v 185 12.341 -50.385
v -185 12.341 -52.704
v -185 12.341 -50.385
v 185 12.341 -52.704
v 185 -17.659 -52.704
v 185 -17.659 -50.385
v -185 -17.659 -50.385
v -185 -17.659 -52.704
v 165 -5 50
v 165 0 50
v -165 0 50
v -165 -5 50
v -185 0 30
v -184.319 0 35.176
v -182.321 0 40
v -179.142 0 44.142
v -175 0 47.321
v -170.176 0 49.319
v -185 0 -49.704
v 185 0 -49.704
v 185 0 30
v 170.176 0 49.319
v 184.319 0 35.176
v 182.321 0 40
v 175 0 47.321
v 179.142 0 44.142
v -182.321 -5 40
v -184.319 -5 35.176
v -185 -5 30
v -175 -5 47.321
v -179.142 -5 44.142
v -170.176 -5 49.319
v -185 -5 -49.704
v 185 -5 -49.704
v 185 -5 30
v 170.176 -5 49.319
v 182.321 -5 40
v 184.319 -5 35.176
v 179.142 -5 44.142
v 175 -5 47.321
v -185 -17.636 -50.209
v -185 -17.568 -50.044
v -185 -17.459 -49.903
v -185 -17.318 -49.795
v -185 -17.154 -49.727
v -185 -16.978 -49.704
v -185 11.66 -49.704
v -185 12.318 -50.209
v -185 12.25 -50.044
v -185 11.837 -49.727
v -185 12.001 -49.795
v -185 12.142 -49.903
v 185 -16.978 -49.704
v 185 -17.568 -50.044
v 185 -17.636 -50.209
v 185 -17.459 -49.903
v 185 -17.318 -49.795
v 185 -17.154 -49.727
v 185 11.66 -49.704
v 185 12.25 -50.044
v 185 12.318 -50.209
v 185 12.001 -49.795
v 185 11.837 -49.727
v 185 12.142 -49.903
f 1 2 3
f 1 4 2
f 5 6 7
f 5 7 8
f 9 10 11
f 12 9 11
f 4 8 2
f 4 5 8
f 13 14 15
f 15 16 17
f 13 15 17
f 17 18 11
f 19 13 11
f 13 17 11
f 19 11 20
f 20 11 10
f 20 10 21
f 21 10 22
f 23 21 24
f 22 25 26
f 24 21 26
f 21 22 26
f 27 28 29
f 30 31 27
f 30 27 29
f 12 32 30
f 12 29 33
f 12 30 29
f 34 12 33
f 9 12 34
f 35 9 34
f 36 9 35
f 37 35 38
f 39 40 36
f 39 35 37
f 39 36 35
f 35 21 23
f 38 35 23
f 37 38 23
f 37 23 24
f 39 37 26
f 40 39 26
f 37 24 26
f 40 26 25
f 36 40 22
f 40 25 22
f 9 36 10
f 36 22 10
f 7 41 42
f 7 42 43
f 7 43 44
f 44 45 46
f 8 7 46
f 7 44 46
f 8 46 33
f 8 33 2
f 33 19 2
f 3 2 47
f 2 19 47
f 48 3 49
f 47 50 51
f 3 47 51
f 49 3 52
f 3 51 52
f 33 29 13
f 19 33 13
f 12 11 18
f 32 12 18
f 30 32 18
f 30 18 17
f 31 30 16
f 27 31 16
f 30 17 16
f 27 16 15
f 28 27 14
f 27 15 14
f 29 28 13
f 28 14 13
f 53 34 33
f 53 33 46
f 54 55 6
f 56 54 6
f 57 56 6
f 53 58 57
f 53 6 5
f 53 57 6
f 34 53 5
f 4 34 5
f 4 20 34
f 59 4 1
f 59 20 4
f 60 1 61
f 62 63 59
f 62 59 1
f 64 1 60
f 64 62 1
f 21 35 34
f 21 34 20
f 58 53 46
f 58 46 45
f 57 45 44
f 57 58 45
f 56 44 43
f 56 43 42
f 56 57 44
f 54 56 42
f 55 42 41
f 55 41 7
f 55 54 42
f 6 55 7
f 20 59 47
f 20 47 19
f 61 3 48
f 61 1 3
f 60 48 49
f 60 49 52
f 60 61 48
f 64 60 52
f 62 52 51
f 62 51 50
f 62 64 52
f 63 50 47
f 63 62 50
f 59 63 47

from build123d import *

# Parameters (mm, degrees)
F1_DEPTH = 5
F3_DEPTH = 185


with BuildPart() as f1:
    # F0 (on Front) → F1 (new body)
    with BuildSketch(Plane.XZ):
        with BuildLine():
            ThreePointArc((185, 30), (179.1421356237, 44.1421356237), (165, 50))
            Line((165, 50), (-165, 50))
            ThreePointArc((-165, 50), (-179.1421356237, 44.1421356237), (-185, 30))
            Line((-185, 30), (-185, -50))
            Line((-185, -50), (185, -50))
            Line((185, -50), (185, 30))
        make_face()
    extrude(amount=F1_DEPTH)

    # F2 (on Right) → F3 (join, symmetric)
    with BuildSketch(Plane.YZ):
        with BuildLine():
            ThreePointArc((12.3411369137, -50.3849132597), (12.1417214903, -49.9034818398), (11.6602900704, -49.7040664163))
            Line((11.6602900704, -49.7040664163), (-16.9780162429, -49.7040664163))
            ThreePointArc((-16.9780162429, -49.7040664163), (-17.4594476628, -49.9034818398), (-17.6588630863, -50.3849132597))
            Line((-17.6588630863, -50.3849132597), (-17.6588630863, -52.7040664163))
            Line((-17.6588630863, -52.7040664163), (12.3411369137, -52.7040664163))
            Line((12.3411369137, -52.7040664163), (12.3411369137, -50.3849132597))
        make_face()
    extrude(amount=F3_DEPTH, both=True)


solid = f1.part
